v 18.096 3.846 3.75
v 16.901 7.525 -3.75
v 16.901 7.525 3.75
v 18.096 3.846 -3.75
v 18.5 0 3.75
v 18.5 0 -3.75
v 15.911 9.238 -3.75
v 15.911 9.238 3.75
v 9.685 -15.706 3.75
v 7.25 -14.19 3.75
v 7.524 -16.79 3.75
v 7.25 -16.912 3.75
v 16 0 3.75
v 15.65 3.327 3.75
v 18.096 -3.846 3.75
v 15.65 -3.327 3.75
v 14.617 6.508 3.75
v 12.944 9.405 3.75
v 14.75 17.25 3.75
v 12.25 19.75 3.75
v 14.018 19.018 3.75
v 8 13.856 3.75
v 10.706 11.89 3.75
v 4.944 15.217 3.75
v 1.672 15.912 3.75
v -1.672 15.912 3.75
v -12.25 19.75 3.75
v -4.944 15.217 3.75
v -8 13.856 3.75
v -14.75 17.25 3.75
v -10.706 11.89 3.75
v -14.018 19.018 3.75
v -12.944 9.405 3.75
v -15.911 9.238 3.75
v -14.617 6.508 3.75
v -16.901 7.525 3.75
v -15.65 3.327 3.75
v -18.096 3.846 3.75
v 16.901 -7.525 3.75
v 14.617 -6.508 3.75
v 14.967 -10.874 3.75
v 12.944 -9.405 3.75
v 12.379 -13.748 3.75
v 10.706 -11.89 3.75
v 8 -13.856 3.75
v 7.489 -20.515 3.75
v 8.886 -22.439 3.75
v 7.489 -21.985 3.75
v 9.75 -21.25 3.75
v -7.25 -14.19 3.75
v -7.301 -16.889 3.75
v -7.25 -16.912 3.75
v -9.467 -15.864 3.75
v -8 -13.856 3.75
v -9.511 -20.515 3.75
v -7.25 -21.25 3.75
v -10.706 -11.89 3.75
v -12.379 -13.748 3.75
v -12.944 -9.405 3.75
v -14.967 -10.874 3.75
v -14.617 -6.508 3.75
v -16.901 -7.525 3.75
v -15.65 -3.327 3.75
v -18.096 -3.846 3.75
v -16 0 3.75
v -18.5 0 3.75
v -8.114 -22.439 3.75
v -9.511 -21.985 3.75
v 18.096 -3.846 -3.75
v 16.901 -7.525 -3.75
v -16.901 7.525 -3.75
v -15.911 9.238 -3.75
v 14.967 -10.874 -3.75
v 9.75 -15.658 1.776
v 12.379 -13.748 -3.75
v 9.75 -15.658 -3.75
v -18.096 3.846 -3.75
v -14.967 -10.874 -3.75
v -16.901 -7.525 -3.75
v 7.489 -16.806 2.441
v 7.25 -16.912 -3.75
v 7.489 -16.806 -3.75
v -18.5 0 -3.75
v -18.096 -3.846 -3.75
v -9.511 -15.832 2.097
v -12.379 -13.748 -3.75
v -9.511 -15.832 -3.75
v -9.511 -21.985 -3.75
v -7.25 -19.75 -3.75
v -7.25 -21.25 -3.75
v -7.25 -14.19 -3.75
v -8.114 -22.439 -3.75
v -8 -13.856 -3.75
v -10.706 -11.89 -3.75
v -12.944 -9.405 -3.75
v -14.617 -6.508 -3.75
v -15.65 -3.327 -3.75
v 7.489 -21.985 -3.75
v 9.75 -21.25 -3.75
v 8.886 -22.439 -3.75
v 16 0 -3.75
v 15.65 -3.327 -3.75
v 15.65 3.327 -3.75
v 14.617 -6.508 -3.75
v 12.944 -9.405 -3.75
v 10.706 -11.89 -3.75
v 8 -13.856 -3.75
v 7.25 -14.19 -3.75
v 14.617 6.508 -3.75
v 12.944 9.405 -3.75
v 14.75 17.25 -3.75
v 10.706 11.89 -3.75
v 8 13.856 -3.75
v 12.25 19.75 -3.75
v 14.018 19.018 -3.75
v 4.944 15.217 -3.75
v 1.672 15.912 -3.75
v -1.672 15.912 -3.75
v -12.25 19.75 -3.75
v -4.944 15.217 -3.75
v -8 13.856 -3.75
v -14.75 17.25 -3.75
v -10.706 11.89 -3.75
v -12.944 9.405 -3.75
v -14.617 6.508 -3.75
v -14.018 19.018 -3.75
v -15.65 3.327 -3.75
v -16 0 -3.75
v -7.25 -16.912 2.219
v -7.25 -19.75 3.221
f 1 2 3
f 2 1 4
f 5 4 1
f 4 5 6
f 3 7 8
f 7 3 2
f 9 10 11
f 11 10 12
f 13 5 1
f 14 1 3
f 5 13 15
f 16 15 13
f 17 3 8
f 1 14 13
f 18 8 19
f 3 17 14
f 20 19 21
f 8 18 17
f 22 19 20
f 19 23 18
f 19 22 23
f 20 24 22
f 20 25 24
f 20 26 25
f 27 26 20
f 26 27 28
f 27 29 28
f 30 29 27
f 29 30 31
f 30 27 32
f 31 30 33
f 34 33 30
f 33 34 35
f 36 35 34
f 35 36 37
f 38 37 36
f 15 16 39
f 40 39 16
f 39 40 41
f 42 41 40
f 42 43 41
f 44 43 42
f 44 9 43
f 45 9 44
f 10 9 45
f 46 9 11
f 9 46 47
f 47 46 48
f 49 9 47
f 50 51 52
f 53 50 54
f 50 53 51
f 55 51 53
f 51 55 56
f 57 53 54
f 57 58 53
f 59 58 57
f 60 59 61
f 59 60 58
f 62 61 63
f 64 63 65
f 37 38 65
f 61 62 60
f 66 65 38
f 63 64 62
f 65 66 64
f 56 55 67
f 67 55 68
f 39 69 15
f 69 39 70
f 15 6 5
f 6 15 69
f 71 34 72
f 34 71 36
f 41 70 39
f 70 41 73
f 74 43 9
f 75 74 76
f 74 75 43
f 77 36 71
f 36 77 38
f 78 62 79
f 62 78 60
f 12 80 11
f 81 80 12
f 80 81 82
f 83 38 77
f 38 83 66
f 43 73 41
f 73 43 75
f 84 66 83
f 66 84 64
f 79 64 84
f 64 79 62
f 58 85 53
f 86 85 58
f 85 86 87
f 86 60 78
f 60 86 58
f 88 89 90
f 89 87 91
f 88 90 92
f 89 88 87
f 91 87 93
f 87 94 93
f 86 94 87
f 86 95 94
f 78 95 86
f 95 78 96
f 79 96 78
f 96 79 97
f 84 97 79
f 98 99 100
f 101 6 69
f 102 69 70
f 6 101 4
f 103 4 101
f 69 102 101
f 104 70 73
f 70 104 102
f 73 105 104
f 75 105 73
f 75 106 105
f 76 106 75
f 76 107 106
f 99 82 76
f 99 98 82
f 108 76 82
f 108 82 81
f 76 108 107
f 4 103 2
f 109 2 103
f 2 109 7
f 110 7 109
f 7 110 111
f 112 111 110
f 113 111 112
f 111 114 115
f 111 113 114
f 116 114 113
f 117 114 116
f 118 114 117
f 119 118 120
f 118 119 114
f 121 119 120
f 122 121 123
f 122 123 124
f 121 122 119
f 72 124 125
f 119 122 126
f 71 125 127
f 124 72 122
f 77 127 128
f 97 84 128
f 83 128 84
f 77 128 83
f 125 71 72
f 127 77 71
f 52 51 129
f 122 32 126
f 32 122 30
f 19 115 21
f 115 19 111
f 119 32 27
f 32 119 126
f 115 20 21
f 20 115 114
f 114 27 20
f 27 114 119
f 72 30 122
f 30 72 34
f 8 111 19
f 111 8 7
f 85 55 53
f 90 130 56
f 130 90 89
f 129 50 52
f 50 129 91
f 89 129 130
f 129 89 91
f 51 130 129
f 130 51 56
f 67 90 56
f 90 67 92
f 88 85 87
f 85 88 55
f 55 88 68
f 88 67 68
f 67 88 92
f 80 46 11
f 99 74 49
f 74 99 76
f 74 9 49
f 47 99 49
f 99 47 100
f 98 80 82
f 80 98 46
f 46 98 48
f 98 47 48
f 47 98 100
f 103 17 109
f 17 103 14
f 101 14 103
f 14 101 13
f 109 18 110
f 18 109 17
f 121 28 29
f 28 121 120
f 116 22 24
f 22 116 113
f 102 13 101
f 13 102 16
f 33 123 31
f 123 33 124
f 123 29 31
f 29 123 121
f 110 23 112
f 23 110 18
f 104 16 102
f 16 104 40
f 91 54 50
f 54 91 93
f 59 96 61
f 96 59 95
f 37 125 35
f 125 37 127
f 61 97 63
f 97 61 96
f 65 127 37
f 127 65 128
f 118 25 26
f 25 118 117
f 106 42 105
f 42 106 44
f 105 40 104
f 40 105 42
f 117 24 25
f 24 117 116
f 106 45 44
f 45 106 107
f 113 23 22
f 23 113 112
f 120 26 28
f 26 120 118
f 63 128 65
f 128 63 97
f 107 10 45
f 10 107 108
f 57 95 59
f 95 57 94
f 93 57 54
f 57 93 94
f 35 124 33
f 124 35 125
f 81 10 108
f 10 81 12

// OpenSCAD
// *** Variables ***
size = 16; // The size of the inner hole in mm
height = 7.5;  // the Z height of the ring
thickness = 2.5; // the thickness of the ring and the bars
gap = 12;  // the size of the gap to fit over the finger
bar_length = 4;  // the size of the bars to help fit over the finger

outer = size + (thickness / 2);

module base()
    union() {
      cylinder(height, size + thickness, size + thickness, true);
      hull() {
        translate([-outer + (thickness*2), outer, -height/2]) cylinder(height, thickness, thickness);
        translate([ outer - (thickness*2), outer, -height/2]) cylinder(height, thickness, thickness);
        translate([-outer + thickness, 0, -height/2]) cylinder(height, thickness, thickness);
        translate([ outer - thickness, 0, -height/2]) cylinder(height, thickness, thickness);
      }
      hull() {
          translate([-gap/2 - thickness, 0, -height/2]) cylinder(height, thickness/2);
          translate([-gap/2 - thickness, -outer - bar_length, -height/2]) cylinder(height, thickness/2, thickness/2);
      }
      hull() {
          translate([gap/2 + thickness, 0, -height/2]) cylinder(height, thickness/2);
          translate([gap/2 + thickness, -outer - bar_length, -height/2]) cylinder(height, thickness/2, thickness/2);
      }
    }

union() {
    difference() {
        base();
        cylinder( height, size, size, true);
        translate([-gap/2 - thickness/2, -outer - thickness, -height/2]) cube(gap + thickness);
    }
}

/* 
difference() {
      hull() {
          translate([-outer, outer, -height/2]) cylinder(height, thickness);
          translate([ outer, outer, -height/2]) cylinder(height, thickness);
          translate([-outer, outer * 2/3, -height/2]) cylinder(height, thickness);
          translate([ outer, outer * 2/3, -height/2]) cylinder(height, thickness);
      }
      hull() {
          translate([-outer/2, outer*2/3 - thickness, -height/2]) cylinder(height, thickness, thickness);
          translate([outer/2, outer*2/3 - thickness, -height/2]) cylinder(height, thickness, thickness);
      }
*/
